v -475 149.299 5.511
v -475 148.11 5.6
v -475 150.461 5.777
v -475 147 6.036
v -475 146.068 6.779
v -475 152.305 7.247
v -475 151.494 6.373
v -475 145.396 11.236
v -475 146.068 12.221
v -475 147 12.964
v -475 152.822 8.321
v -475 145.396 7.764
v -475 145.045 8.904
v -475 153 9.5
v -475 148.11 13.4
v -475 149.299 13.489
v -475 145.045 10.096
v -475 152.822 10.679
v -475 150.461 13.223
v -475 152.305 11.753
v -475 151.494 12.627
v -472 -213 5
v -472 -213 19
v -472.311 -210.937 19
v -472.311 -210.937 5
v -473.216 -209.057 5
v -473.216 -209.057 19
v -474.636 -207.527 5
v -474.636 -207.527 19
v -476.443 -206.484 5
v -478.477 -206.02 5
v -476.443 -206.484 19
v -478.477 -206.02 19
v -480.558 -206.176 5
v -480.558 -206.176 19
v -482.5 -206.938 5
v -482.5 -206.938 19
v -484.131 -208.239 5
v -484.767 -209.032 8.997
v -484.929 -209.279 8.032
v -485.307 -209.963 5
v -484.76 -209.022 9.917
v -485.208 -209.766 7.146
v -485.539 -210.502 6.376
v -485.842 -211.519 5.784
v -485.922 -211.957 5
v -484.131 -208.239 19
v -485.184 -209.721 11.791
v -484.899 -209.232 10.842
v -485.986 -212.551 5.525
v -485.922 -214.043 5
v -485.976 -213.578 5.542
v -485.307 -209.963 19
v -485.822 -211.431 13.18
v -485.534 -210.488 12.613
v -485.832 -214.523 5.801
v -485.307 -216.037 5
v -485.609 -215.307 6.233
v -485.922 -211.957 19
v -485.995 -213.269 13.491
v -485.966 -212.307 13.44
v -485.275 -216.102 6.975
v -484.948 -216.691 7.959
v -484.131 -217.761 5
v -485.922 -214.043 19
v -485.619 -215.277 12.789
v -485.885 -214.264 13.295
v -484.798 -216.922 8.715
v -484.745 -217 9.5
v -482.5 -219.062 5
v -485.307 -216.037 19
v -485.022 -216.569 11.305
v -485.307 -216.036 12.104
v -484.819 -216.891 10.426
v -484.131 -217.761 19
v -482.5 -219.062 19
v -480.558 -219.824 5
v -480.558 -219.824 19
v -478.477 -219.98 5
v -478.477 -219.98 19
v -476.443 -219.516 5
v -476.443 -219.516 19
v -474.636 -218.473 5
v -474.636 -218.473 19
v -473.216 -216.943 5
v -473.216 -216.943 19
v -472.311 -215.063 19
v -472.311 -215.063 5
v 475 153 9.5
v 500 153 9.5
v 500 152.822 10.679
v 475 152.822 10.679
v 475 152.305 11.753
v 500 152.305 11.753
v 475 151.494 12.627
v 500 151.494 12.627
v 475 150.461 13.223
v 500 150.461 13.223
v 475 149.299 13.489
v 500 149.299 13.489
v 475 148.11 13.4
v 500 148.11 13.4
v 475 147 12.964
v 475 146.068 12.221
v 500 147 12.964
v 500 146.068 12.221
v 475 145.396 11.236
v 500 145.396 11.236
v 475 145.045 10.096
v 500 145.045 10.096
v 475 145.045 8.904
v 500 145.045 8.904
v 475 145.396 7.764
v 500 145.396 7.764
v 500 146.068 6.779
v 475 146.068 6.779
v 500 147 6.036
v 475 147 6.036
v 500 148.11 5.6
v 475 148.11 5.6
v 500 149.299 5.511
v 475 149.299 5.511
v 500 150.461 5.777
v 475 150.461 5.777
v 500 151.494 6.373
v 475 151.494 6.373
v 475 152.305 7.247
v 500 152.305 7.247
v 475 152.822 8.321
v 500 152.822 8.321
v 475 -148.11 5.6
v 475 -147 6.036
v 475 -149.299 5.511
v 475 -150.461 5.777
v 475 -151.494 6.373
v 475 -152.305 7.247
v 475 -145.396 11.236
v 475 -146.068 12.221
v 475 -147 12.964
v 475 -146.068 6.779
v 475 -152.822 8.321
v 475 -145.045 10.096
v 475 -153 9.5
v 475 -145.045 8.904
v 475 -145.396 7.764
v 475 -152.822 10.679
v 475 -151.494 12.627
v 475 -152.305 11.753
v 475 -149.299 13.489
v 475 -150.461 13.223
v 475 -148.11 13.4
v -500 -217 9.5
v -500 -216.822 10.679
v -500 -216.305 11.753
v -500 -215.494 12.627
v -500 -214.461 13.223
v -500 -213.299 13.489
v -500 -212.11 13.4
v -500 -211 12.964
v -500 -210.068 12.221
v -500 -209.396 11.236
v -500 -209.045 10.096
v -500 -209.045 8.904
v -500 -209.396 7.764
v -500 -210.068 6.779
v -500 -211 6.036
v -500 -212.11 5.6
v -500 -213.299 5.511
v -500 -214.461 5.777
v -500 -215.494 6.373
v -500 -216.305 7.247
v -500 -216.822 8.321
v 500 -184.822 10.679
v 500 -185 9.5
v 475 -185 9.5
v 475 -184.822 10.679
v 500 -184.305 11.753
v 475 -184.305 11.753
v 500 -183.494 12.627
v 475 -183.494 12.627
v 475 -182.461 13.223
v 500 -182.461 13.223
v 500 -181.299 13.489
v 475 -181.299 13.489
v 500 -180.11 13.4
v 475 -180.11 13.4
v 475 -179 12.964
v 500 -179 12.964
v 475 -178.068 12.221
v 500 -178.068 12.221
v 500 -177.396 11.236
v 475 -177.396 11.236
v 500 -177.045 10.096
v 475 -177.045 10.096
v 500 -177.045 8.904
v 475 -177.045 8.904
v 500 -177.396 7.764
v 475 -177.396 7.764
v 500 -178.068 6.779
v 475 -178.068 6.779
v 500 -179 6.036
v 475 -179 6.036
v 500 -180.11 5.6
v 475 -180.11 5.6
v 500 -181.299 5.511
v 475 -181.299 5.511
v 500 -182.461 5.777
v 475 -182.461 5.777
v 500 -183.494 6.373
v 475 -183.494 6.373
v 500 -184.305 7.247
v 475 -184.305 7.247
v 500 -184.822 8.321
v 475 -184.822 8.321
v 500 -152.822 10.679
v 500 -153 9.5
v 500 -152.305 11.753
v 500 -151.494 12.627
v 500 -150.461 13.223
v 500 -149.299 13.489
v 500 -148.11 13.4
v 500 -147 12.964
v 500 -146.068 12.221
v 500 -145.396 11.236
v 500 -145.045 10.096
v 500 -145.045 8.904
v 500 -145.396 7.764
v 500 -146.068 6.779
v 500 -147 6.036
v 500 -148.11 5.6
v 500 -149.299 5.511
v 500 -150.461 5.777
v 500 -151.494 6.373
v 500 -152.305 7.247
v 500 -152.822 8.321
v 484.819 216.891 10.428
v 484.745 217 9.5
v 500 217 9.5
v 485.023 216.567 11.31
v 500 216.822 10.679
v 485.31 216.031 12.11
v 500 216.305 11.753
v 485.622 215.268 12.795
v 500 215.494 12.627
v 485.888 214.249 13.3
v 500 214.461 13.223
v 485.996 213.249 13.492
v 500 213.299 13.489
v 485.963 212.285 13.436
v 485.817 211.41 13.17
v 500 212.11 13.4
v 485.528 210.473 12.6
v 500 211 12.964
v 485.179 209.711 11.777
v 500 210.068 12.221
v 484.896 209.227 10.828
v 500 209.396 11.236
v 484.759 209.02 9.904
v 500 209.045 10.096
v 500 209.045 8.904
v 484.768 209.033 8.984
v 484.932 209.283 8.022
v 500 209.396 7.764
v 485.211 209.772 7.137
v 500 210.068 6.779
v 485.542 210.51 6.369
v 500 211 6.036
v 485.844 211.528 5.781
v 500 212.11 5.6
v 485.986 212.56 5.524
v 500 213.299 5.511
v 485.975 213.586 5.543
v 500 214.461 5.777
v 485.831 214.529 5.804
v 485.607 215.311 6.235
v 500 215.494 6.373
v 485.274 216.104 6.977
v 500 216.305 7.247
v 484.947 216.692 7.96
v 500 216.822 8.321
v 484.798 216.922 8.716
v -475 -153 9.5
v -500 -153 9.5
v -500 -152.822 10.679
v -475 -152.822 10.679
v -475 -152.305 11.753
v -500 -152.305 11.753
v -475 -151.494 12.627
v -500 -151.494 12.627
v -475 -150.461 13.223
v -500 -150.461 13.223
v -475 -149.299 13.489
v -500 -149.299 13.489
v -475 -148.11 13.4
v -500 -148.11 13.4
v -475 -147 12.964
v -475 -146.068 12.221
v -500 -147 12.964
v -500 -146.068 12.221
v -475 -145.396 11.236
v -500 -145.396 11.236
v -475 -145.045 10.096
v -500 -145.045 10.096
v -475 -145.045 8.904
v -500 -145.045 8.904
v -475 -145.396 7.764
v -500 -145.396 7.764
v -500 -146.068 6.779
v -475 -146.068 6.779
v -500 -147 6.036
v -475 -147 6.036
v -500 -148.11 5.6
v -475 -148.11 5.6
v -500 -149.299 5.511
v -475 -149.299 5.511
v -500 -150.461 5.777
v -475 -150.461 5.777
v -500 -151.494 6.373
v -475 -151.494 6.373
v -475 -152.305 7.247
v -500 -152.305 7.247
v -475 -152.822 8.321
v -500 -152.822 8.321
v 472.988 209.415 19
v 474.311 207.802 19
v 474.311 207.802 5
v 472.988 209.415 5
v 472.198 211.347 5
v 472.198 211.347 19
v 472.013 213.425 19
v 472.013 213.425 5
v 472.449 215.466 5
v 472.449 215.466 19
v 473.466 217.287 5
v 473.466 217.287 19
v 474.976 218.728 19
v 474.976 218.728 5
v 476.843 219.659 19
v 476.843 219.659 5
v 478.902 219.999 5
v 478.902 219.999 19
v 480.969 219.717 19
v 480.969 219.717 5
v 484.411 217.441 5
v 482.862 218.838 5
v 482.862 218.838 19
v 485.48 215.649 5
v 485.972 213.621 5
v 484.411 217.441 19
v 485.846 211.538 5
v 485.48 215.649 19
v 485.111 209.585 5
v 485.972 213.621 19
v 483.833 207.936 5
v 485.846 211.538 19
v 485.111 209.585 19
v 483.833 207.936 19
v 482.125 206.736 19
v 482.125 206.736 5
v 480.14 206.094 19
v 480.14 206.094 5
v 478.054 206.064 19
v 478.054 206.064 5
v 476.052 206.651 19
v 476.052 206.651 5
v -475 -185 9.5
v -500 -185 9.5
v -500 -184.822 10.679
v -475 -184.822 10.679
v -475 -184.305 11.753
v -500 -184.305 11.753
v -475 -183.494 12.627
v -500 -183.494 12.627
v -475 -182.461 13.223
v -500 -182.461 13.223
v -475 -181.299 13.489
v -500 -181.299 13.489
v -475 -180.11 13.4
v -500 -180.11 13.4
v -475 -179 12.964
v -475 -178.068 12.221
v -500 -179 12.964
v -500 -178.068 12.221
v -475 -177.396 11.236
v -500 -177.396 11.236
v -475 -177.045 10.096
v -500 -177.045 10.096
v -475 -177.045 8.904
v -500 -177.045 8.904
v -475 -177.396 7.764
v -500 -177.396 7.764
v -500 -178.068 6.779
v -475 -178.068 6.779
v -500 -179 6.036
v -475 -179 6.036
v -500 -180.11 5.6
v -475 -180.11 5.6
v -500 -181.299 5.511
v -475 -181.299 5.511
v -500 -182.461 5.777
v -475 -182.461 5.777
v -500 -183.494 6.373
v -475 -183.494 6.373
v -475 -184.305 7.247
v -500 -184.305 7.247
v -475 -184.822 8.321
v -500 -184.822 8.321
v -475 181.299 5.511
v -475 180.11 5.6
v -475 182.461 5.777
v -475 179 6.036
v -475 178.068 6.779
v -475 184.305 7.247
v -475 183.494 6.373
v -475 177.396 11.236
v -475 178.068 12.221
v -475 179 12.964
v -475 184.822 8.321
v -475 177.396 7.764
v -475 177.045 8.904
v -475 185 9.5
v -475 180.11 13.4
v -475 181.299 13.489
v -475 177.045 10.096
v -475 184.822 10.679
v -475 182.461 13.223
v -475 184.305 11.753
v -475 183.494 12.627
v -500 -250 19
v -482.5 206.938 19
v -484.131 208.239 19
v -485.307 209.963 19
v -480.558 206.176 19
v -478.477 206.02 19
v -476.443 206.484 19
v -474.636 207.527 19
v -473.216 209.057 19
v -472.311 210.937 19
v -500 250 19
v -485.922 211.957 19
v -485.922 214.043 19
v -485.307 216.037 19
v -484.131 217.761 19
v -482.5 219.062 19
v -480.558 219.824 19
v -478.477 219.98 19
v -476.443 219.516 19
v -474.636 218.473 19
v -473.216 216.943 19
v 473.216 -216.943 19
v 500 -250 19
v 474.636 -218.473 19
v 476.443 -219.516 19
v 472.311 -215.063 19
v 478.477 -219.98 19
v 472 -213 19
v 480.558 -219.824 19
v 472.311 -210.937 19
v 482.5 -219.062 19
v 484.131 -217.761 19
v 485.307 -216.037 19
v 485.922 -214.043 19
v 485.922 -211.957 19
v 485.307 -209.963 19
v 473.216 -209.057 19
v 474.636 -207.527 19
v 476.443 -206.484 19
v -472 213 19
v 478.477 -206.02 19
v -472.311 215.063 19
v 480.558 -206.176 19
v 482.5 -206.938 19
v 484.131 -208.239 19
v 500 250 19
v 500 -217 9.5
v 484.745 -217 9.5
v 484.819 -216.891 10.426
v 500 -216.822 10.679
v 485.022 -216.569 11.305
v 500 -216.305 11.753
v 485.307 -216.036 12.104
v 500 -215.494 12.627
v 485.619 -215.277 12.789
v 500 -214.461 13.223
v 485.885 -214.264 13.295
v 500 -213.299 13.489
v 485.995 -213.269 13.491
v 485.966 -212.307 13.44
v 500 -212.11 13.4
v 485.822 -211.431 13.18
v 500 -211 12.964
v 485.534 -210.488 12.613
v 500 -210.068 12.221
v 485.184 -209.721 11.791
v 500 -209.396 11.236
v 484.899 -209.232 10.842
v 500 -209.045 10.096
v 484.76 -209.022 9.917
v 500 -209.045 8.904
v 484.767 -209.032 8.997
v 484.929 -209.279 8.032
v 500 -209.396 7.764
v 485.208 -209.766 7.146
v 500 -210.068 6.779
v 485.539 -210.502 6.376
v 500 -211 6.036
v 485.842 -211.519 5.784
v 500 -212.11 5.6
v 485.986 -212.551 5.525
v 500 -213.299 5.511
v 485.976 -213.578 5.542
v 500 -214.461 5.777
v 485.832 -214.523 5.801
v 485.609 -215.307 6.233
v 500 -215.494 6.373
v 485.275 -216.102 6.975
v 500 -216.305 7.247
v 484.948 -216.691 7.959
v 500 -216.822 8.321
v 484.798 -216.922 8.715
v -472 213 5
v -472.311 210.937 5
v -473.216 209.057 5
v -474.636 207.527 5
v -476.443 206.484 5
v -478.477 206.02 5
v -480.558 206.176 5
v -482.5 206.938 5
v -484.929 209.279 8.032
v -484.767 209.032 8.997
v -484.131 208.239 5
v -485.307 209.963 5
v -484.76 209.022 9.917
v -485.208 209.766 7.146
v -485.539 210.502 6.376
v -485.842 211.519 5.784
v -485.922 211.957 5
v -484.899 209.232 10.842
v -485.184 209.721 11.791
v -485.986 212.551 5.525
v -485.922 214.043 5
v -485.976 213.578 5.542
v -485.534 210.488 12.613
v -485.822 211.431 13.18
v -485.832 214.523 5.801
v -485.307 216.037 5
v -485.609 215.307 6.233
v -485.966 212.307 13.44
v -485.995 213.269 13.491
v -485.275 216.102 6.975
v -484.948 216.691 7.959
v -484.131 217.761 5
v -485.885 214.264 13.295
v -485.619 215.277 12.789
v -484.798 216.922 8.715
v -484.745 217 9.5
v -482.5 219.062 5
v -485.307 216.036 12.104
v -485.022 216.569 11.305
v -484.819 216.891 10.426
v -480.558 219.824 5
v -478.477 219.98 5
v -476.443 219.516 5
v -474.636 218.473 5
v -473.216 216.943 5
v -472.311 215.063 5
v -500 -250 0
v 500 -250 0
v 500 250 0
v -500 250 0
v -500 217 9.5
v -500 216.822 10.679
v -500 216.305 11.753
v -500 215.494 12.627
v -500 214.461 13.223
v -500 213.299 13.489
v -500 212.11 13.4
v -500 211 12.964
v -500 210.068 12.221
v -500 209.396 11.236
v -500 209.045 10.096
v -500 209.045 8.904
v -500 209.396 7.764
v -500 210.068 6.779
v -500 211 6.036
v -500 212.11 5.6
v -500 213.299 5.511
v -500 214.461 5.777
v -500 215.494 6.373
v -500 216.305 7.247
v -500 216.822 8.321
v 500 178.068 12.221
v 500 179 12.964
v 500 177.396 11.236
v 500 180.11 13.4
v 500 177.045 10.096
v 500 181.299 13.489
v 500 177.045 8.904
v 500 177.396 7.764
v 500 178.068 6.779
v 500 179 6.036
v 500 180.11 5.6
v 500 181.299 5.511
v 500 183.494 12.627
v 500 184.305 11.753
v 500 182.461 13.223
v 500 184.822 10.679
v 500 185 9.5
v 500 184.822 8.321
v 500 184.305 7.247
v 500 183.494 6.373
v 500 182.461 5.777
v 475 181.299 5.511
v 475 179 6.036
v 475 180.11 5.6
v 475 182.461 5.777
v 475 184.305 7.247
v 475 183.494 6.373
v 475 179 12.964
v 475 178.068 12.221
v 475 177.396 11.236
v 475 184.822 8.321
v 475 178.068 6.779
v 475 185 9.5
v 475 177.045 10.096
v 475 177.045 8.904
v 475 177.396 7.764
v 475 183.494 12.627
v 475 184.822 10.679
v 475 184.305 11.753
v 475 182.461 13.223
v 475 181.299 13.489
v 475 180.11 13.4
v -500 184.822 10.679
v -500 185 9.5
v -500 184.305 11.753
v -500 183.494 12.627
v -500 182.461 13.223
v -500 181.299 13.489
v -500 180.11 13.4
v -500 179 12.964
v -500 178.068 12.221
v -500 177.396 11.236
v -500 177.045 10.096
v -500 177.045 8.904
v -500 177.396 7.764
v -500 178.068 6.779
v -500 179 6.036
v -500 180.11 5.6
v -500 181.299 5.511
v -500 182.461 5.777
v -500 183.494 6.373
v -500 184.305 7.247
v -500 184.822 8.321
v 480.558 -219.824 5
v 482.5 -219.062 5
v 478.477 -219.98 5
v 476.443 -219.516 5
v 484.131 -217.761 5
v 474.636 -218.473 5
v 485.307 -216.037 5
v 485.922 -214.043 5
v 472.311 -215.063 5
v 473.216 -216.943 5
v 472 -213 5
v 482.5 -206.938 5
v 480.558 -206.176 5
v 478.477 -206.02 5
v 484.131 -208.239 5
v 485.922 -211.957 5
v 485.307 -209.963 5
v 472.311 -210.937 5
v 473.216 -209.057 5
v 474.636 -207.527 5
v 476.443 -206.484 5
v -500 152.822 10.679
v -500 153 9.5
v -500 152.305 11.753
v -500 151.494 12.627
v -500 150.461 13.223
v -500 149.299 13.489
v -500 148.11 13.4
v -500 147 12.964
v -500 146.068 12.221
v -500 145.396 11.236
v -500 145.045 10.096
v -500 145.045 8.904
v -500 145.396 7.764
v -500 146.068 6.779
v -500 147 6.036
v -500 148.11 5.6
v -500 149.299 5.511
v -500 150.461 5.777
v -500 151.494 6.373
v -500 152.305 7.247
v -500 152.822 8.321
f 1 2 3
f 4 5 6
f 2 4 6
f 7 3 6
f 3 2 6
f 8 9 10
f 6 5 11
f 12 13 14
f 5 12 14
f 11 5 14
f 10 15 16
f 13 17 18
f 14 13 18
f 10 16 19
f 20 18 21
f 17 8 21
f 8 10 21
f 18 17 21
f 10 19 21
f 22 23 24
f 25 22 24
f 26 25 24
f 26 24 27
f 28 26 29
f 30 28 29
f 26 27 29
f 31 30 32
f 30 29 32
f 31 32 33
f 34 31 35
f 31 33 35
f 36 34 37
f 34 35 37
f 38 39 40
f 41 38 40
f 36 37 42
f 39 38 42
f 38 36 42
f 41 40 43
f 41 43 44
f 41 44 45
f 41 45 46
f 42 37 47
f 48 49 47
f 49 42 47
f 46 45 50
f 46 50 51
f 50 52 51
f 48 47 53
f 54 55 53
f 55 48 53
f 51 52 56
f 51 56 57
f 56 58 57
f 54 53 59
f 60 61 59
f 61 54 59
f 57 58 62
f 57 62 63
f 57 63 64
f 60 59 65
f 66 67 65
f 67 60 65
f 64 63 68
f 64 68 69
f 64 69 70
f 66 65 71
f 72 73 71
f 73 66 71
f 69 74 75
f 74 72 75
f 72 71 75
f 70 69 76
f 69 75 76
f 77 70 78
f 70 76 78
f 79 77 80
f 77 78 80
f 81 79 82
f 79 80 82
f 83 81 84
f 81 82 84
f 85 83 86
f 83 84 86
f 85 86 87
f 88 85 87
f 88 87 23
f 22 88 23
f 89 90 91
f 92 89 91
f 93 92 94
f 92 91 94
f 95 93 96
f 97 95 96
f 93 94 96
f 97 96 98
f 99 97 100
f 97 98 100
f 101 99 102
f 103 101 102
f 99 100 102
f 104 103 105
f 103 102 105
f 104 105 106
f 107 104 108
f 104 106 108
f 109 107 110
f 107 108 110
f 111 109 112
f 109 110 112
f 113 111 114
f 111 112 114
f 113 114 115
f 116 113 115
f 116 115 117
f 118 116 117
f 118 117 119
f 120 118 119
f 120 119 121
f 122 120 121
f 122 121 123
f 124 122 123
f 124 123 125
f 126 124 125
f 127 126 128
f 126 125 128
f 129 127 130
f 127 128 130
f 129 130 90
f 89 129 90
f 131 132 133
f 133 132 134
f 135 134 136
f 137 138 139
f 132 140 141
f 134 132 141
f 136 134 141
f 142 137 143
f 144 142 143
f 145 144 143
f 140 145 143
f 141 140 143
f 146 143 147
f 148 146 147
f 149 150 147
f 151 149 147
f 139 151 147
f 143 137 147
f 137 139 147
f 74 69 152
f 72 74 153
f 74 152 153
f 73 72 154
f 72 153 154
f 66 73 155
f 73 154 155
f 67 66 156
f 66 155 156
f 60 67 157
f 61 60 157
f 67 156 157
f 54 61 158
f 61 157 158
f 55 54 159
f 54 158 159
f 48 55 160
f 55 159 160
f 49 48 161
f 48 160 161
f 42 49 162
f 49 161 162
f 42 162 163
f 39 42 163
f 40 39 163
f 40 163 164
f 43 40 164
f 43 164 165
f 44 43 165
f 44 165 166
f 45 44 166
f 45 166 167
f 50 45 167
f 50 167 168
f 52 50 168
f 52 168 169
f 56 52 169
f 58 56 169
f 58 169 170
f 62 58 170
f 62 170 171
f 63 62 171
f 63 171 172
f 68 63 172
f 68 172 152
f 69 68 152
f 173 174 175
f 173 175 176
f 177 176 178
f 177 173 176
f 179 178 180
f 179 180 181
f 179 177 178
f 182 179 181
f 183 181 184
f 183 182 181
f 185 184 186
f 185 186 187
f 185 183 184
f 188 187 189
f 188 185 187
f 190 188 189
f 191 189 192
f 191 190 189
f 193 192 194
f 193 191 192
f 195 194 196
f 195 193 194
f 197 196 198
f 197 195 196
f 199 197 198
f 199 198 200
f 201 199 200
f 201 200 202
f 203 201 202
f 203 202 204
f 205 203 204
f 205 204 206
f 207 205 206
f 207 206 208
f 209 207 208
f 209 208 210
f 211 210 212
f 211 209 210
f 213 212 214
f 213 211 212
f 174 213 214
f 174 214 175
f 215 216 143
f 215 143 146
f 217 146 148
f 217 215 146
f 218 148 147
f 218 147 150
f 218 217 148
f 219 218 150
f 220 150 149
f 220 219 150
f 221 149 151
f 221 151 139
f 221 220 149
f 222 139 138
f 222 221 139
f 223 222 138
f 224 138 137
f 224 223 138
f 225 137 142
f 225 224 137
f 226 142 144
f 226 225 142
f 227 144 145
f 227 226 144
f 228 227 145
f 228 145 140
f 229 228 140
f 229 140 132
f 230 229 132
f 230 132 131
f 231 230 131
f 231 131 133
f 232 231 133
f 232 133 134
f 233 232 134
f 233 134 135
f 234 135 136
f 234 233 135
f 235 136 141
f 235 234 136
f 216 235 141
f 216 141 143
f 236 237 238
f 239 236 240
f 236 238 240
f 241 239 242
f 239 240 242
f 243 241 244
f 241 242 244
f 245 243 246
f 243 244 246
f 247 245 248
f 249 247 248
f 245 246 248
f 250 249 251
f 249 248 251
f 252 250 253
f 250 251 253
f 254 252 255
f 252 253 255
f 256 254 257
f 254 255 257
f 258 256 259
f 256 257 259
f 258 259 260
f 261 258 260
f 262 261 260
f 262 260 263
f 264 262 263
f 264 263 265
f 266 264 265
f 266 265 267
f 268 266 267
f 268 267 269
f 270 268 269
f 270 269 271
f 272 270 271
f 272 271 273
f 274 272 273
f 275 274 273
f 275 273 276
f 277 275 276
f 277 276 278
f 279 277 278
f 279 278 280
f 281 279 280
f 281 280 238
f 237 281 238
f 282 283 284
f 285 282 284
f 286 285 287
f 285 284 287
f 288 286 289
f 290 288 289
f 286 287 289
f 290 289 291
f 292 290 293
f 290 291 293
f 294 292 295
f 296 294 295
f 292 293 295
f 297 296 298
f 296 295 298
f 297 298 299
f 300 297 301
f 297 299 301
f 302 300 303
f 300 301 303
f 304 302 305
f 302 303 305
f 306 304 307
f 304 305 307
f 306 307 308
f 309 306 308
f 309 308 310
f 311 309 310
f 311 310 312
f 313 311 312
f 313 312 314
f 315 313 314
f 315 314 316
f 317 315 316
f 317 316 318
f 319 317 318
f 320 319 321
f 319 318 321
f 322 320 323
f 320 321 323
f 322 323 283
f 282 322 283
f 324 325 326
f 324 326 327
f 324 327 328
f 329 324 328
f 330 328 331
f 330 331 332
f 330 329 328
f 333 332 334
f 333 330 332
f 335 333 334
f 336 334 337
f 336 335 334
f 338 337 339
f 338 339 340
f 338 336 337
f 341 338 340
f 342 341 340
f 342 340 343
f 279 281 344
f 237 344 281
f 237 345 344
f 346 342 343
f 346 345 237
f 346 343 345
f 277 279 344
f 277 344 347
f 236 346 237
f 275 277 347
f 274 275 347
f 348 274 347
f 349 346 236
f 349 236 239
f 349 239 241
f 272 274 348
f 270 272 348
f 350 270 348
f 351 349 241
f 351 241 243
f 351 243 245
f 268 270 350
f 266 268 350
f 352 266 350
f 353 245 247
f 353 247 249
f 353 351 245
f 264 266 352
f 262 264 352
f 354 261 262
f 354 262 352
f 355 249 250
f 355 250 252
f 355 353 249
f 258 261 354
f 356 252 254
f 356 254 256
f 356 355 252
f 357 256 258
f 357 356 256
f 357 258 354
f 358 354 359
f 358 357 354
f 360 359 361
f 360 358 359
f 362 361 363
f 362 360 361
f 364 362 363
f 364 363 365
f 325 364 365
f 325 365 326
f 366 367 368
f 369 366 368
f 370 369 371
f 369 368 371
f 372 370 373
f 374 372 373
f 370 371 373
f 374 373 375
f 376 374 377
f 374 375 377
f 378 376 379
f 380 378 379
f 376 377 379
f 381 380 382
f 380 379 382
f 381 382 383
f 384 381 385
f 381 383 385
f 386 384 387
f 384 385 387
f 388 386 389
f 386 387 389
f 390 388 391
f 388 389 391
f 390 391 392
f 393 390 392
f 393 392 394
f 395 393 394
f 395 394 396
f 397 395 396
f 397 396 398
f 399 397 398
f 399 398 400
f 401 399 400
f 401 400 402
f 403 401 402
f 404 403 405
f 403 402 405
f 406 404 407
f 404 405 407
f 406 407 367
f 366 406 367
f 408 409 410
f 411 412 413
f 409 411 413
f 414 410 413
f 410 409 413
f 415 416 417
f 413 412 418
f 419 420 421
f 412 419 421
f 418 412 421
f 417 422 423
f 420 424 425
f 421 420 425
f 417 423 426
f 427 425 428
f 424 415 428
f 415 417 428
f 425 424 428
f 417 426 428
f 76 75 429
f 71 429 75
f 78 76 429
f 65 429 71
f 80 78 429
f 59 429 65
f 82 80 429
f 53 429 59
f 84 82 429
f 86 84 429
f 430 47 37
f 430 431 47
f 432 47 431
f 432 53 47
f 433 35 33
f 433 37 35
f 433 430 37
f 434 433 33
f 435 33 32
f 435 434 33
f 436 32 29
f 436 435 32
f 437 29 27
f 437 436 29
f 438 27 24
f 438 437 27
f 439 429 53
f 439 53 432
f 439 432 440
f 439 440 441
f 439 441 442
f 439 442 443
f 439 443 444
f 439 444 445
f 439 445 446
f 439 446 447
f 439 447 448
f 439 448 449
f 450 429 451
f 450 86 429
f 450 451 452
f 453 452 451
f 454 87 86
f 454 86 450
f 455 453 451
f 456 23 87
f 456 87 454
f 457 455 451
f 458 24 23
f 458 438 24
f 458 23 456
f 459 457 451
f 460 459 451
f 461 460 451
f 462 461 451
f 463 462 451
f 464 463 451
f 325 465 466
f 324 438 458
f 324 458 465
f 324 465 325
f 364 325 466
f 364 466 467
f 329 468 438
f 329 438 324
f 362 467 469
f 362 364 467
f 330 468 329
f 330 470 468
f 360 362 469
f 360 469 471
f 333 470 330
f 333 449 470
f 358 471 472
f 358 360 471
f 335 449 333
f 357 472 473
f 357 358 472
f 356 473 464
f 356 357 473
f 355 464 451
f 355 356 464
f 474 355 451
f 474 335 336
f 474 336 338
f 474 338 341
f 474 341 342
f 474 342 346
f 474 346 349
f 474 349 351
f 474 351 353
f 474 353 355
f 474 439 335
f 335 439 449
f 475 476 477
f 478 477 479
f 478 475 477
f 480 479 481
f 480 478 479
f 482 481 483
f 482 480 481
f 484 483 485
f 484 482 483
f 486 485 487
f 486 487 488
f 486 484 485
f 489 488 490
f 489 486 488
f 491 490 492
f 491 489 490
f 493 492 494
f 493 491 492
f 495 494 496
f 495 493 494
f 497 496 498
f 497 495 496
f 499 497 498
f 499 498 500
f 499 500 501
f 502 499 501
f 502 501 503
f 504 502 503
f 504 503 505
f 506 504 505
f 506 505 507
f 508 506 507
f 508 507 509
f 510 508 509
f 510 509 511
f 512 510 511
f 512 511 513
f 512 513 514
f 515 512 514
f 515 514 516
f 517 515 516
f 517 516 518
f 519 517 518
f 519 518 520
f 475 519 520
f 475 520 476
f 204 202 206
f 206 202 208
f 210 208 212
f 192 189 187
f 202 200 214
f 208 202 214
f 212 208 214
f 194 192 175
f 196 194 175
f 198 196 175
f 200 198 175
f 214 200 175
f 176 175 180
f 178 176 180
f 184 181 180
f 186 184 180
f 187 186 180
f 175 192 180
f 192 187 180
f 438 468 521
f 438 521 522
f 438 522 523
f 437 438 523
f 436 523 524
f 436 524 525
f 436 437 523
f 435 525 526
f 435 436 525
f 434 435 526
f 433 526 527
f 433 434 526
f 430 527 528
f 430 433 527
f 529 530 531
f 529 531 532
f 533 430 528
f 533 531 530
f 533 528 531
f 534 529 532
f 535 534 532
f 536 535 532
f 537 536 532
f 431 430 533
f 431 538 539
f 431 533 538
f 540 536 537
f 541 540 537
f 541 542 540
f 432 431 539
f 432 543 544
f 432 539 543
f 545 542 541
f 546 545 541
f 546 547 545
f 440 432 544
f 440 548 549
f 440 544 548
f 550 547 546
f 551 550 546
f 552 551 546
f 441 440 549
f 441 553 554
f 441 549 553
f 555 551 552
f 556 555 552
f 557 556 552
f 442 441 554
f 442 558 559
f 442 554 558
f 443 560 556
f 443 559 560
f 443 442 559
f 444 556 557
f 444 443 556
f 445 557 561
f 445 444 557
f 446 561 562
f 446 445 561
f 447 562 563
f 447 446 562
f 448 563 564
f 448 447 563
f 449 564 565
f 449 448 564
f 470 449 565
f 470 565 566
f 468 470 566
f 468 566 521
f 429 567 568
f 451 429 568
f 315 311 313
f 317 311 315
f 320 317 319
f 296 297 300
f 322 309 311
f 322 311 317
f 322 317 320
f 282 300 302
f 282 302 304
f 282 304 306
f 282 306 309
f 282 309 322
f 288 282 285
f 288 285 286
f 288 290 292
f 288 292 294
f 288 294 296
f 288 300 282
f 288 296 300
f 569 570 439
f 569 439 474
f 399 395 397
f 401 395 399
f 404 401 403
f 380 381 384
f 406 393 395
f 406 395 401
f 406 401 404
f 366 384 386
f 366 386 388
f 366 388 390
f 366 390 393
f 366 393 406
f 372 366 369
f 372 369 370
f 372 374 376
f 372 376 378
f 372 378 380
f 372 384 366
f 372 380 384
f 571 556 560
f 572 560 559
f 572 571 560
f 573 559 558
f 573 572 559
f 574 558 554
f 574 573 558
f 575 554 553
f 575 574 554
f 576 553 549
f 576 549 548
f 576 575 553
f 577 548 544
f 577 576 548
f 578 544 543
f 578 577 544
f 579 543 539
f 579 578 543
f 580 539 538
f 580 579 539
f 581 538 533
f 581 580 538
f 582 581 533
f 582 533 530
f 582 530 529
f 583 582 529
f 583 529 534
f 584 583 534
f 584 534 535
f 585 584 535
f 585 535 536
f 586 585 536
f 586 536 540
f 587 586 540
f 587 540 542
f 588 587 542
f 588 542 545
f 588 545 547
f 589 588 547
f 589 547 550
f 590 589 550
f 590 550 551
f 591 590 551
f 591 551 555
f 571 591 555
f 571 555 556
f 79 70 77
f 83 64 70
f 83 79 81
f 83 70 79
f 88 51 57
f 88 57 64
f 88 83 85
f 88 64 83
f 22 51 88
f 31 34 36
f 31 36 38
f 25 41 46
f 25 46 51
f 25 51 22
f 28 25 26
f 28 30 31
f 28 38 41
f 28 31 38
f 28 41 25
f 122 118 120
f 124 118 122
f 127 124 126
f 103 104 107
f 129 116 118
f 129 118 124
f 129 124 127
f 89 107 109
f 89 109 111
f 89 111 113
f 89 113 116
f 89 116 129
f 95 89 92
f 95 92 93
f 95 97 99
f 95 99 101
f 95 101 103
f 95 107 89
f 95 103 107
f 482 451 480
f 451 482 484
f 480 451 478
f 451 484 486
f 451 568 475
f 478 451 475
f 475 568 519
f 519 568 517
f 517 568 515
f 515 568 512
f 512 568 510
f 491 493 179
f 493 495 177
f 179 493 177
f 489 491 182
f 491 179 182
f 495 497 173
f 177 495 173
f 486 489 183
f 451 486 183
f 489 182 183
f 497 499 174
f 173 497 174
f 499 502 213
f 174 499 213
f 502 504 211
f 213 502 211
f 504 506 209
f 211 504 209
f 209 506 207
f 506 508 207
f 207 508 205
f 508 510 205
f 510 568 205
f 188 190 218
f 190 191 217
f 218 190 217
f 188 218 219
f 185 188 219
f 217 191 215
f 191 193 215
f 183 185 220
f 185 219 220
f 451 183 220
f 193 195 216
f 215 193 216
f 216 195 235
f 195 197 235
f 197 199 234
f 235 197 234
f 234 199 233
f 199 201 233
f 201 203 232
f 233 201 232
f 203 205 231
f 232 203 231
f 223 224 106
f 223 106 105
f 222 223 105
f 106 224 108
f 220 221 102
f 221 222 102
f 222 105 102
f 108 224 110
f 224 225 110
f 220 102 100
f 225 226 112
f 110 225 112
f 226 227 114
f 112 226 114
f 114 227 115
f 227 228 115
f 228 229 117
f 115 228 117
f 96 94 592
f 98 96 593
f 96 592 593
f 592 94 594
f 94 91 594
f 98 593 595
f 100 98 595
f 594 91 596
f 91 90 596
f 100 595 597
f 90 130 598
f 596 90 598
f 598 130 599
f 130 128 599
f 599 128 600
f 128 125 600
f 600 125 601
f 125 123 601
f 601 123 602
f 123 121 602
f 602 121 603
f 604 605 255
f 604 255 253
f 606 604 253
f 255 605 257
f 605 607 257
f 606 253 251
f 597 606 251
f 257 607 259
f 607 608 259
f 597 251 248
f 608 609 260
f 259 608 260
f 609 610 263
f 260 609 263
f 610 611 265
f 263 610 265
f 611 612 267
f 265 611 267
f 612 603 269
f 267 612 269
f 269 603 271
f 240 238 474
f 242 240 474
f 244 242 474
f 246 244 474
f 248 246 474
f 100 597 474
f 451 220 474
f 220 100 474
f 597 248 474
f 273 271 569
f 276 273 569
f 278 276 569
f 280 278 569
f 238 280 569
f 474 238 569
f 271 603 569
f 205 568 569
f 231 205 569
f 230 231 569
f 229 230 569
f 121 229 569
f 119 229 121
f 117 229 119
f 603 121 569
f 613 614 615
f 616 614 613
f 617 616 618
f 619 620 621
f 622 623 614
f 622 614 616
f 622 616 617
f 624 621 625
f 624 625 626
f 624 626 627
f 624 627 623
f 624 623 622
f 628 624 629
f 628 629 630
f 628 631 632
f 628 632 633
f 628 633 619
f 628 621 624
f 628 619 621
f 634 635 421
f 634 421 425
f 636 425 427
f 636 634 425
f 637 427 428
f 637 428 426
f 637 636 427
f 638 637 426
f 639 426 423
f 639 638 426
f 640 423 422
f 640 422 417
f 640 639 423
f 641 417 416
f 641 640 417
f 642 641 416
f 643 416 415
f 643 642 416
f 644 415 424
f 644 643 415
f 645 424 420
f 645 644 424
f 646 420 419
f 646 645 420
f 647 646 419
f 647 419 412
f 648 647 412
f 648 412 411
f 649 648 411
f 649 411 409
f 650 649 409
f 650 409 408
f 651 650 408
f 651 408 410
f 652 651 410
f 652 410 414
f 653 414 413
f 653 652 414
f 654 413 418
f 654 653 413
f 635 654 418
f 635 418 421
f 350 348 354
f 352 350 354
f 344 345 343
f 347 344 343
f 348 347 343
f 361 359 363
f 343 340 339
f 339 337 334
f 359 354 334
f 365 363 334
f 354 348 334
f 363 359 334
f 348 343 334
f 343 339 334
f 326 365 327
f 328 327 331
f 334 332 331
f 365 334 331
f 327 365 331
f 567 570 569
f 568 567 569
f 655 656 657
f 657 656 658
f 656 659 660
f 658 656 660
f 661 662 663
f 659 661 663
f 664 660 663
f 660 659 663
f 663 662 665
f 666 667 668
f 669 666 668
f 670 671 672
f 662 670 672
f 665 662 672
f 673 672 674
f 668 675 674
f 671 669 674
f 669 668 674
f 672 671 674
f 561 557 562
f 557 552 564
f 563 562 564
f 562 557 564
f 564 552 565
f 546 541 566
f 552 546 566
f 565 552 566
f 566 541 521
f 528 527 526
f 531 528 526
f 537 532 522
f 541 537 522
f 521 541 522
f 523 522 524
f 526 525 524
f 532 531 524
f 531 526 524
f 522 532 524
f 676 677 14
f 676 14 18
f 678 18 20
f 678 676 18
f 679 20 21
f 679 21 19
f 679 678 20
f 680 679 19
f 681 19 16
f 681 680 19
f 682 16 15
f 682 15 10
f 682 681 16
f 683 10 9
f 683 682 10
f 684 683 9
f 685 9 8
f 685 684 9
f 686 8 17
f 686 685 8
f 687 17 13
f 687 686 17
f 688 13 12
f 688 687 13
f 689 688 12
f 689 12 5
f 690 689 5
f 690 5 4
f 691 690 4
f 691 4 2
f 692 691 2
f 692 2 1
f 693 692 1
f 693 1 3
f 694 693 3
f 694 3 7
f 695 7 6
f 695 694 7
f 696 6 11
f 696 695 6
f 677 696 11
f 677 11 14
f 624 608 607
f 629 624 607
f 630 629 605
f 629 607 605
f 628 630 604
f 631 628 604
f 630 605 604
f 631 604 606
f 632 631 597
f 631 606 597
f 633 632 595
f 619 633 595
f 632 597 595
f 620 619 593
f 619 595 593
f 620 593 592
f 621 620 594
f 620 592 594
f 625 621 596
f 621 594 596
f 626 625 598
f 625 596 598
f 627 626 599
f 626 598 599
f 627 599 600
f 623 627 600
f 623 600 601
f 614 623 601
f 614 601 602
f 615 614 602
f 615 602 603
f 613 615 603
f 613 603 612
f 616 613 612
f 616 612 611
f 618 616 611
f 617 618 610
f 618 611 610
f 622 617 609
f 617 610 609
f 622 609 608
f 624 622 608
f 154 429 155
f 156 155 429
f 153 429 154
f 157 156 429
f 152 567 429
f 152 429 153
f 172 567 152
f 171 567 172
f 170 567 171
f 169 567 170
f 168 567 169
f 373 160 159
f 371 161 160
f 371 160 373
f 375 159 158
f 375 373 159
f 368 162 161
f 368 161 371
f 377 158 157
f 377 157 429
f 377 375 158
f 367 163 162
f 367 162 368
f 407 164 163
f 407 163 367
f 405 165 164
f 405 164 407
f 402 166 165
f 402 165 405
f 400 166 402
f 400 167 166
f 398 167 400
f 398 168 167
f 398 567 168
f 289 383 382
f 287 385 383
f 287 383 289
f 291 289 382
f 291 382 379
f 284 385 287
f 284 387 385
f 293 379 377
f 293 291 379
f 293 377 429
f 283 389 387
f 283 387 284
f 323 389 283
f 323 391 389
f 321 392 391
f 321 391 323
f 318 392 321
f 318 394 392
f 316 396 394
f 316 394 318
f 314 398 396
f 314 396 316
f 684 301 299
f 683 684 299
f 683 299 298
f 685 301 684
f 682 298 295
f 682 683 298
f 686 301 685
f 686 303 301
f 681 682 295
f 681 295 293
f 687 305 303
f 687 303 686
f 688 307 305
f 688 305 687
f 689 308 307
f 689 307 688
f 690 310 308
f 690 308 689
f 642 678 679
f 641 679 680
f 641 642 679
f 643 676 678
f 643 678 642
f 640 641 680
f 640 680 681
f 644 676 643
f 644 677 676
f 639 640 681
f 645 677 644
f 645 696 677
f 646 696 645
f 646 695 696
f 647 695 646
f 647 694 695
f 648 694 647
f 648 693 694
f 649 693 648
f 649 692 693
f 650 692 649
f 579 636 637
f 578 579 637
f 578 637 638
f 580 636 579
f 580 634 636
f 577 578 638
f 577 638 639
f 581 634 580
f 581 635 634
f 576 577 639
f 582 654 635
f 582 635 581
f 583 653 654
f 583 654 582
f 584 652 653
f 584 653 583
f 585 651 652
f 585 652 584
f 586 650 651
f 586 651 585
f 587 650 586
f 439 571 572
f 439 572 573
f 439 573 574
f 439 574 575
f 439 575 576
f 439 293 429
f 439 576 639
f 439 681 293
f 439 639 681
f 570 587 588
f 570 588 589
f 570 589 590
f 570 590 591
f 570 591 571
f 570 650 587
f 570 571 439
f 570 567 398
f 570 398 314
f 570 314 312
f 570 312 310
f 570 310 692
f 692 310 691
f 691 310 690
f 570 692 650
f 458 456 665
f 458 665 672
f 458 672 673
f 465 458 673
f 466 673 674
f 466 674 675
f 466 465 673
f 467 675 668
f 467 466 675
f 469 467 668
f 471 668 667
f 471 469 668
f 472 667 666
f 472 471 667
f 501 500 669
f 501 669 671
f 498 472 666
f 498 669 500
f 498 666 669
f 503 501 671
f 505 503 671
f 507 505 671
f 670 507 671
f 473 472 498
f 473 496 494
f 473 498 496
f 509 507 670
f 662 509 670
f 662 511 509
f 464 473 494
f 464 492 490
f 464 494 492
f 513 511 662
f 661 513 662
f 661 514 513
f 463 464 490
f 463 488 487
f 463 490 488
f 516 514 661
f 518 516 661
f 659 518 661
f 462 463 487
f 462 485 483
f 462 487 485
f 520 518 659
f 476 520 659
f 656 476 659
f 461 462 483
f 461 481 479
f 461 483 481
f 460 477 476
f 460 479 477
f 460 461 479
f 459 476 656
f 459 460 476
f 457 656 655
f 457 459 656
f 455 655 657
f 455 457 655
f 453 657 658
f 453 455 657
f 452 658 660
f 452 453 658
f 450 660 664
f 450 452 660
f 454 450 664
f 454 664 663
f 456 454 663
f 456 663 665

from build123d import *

# Parameters (mm, degrees)
F0_W             = 1000
F0_H             = 500
F1_DEPTH         = 19
F2_R             = 7
F3_DEPTH         = 14
F4_R             = 4
F5_DEPTH         = 25
F5_COPIES2_COUNT = 2


# Not quite as in the source:
# - a pattern or mirror of a feature is missing from the dataset's text; its kind, count and spacing are read off the source's solid


with BuildPart() as f1:
    # F0 (on Top) → F1 (new body)
    with BuildSketch(Plane.XY):
        Rectangle(F0_W, F0_H)
    extrude(amount=F1_DEPTH)

    # F2 (on face) → F3 (cut)
    with BuildSketch(Plane.XY.offset(19)):
        with Locations((-479, -213)):
            Circle(F2_R)
    f3 = extrude(amount=-F3_DEPTH, mode=Mode.SUBTRACT)

    # F3_copies: F3 across plane
    add(f3.mirror(Plane(origin=(0, 0, 0), x_dir=(-0.4063154508, 0.9137328682, 0), z_dir=(0.9137328682, 0.4063154508, 0))), mode=Mode.SUBTRACT)

    # F3_copies1: F3 across plane
    add(f3.mirror(Plane(origin=(0, 0, 0), x_dir=(0, 0, 1), z_dir=(1, 0, 0))), mode=Mode.SUBTRACT)

    # F3_copies2: F3 across plane
    add(f3.mirror(Plane.ZX), mode=Mode.SUBTRACT)

    # F4 (on face) → F5 (cut)
    with BuildSketch(Plane(origin=(-500, 0, 0), x_dir=(0, -1, 0), z_dir=(-1, 0, 0))):
        with Locations((213, 9.5)):
            Circle(F4_R)
        with Locations((181, 9.5)):
            Circle(F4_R)
        with Locations((149, 9.5)):
            Circle(F4_R)
    f5 = extrude(amount=-F5_DEPTH, mode=Mode.SUBTRACT)

    # F5_copies: F5 across plane
    add(f5.mirror(Plane(origin=(0, 0, 0), x_dir=(0, 0, 1), z_dir=(1, 0, 0))), mode=Mode.SUBTRACT)

    # F5_copies1: F5 across plane
    add(f5.mirror(Plane.ZX), mode=Mode.SUBTRACT)

    # F5_copies2: F5 ×2 about axis
    f5_copies2_axis = Axis((0, 0, 0), (0, 0, 1))
    for i in range(1, F5_COPIES2_COUNT):
        add(f5.rotate(f5_copies2_axis, i * 360 / F5_COPIES2_COUNT), mode=Mode.SUBTRACT)


solid = f1.part
